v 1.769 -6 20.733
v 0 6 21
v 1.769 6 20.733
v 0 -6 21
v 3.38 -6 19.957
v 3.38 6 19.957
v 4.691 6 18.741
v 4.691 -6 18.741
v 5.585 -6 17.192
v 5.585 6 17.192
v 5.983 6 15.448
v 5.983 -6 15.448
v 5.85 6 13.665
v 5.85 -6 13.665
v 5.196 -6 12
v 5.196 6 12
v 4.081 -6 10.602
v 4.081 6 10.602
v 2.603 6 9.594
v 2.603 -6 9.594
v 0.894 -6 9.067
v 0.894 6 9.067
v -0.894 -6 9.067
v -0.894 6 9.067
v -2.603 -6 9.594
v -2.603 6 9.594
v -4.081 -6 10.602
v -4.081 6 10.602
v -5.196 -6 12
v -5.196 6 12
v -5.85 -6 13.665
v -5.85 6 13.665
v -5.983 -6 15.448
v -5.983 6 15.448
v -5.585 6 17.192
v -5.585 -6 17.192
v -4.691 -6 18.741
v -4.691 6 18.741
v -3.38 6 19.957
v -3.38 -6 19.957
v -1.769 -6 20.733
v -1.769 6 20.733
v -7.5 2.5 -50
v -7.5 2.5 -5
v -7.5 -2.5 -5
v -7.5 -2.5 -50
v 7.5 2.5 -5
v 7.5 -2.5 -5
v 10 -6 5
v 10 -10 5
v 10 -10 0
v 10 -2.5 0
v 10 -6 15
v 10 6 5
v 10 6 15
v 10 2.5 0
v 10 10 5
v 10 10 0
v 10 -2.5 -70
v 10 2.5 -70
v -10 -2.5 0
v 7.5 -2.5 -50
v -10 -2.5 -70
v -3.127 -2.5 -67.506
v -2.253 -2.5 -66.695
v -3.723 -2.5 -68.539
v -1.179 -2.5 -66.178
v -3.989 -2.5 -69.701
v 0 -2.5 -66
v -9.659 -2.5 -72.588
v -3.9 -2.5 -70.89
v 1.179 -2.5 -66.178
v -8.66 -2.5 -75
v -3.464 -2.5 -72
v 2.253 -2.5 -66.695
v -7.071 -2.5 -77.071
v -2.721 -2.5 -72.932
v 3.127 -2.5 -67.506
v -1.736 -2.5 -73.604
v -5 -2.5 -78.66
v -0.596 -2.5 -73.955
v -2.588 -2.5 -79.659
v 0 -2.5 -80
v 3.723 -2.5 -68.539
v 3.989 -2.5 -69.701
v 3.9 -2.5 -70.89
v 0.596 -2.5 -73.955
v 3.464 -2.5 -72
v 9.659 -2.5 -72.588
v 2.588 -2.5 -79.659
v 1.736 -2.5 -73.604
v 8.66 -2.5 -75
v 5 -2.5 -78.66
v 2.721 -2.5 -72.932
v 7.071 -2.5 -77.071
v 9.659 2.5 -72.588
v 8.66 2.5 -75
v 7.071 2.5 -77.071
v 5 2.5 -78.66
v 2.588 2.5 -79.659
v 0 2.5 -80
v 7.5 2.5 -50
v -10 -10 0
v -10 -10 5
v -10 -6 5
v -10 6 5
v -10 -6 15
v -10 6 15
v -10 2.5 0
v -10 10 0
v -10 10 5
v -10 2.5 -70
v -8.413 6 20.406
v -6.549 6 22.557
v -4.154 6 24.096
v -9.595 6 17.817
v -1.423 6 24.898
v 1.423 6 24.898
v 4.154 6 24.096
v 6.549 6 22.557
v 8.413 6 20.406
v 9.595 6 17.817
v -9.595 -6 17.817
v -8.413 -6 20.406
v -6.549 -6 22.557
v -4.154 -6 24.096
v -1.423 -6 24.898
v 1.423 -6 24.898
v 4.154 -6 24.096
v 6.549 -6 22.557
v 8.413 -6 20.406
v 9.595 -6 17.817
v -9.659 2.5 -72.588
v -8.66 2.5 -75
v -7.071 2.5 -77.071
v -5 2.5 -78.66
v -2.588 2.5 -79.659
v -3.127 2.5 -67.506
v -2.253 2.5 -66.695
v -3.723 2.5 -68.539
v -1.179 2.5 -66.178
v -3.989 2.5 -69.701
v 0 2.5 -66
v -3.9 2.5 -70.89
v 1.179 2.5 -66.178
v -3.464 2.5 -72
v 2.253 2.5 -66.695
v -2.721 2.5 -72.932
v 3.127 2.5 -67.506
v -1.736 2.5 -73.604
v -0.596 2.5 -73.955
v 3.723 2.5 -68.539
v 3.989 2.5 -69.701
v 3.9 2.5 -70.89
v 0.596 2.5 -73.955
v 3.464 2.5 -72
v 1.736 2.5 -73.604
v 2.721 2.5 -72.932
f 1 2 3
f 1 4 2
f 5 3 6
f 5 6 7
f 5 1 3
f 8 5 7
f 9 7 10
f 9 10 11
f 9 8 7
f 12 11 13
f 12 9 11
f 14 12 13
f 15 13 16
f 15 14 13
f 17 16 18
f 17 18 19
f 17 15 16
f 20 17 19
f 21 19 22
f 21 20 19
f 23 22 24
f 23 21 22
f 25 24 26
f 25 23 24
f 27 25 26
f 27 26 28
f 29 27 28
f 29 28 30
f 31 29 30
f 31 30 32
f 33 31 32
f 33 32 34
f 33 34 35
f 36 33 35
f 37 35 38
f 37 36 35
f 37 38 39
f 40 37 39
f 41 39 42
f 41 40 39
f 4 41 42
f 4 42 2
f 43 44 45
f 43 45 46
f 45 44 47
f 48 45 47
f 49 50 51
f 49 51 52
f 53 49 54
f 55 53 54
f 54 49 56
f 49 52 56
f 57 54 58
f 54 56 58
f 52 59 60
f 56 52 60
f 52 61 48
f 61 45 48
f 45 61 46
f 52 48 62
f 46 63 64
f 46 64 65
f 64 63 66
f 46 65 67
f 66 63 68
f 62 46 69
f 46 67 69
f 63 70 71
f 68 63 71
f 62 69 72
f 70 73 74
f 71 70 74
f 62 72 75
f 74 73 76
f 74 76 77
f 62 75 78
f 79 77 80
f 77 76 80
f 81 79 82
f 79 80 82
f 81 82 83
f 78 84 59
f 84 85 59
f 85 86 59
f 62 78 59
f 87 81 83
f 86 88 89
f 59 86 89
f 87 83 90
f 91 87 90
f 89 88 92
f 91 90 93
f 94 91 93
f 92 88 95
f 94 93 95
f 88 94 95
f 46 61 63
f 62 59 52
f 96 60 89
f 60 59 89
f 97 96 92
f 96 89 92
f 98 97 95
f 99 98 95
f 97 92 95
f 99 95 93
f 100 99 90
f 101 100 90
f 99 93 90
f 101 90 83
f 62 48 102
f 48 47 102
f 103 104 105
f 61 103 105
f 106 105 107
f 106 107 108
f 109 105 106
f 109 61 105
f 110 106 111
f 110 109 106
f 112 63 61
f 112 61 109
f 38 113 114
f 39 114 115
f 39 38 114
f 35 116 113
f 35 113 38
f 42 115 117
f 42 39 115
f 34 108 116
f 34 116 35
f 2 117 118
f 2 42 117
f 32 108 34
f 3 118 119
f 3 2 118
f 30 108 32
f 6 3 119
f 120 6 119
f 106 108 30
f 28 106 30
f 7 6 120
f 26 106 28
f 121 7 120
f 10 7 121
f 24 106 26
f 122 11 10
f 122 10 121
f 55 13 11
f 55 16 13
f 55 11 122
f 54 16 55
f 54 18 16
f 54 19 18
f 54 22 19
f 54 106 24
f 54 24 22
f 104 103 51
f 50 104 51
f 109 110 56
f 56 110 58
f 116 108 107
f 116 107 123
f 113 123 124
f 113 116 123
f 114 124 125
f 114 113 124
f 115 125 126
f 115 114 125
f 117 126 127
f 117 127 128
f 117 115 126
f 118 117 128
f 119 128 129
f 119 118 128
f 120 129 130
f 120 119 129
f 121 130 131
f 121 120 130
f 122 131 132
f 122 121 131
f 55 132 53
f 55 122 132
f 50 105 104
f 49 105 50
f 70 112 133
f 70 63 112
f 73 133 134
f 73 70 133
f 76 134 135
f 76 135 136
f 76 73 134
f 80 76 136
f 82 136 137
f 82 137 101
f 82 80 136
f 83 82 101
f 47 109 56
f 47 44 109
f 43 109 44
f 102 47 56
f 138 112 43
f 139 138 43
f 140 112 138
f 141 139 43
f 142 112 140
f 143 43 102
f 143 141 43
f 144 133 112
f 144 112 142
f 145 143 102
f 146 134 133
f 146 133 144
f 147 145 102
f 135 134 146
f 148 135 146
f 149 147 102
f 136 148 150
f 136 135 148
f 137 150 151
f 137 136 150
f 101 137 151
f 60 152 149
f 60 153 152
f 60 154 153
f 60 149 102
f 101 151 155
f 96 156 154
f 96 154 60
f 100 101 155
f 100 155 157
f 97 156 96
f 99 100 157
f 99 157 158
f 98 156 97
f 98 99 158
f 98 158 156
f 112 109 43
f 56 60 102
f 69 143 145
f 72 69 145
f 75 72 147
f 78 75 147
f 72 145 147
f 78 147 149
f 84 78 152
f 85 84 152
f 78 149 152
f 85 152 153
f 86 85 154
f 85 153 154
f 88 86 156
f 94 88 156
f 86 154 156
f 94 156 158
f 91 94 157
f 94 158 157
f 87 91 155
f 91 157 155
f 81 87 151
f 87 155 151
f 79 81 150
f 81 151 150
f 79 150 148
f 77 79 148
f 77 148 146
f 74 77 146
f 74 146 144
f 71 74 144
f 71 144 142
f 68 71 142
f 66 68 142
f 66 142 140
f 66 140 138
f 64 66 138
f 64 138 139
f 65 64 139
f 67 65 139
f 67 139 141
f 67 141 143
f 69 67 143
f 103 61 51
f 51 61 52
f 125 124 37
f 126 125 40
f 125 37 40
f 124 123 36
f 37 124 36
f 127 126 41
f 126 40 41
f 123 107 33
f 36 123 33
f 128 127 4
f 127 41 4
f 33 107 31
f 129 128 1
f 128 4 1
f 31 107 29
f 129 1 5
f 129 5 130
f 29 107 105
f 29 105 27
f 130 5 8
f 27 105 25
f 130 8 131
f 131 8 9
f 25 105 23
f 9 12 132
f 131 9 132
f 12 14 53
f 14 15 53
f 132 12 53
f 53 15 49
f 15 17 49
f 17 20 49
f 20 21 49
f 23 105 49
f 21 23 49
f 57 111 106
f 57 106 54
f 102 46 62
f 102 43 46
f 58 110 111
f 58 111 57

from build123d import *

# Parameters (mm, degrees)
SKETCH_1_W          = 20
SKETCH_1_H          = 20
EXTRUDE_1_DEPTH     = 5
SKETCH_3_W          = 20
SKETCH_3_H          = 80
SKETCH_3_W_2        = 15
SKETCH_3_H_2        = 45
EXTRUDE_2_DEPTH     = 2.5
FILLET_1_R          = 10
SKETCH_5_R          = 4
CUT_EXTRUDE_1_DEPTH = 82.58584436
SKETCH_6_R          = 6
EXTRUDE_3_DEPTH     = 6


with BuildPart() as part:
    # 草图1 → 凸台-拉伸1 (new body)
    with BuildSketch(Plane.XY):
        Rectangle(SKETCH_1_W, SKETCH_1_H)
    extrude(amount=EXTRUDE_1_DEPTH)

    # 草图3 → 凸台-拉伸2 (add, symmetric)
    with BuildSketch(Plane(origin=(0, 0, 0), x_dir=(1, 0, 0), z_dir=(0, 1, 0))):
        with Locations((0, 40)):
            Rectangle(SKETCH_3_W, SKETCH_3_H)
        with Locations((0, 27.5)):
            Rectangle(SKETCH_3_W_2, SKETCH_3_H_2, mode=Mode.SUBTRACT)
    extrude(amount=EXTRUDE_2_DEPTH, both=True)

    # 圆角1
    fillet_1_edges = [part.edges().sort_by_distance(p)[0] for p in [
        (10, 0, -80),
        (-10, 0, -80),
    ]]
    fillet(fillet_1_edges, radius=FILLET_1_R - 0.0001)  # a hair under: the kernel refuses the full size

    # 草图5 → 切除-拉伸1 (cut, through all)
    with BuildSketch(Plane(origin=(0, 2.5, 0), x_dir=(1, 0, 0), z_dir=(0, 1, 0))):
        with Locations(Location((0, 70, 0), (0, 0, 270))):
            Circle(SKETCH_5_R)
    extrude(amount=-CUT_EXTRUDE_1_DEPTH, mode=Mode.SUBTRACT)

    # 草图6 → 凸台-拉伸3 (add, symmetric)
    with BuildSketch(Plane(origin=(0, 0, 0), x_dir=(1, 0, 0), z_dir=(0, 1, 0))):
        with BuildLine():
            Line((-10, -5), (-10, -15))
            ThreePointArc((-10, -15), (0, -25), (10, -15))
            Line((10, -15), (10, -5))
            Line((10, -5), (-10, -5))
        make_face()
        with Locations(Location((0, -15, 0), (0, 0, 270))):
            Circle(SKETCH_6_R, mode=Mode.SUBTRACT)
    extrude(amount=EXTRUDE_3_DEPTH, both=True)


solid = part.part
